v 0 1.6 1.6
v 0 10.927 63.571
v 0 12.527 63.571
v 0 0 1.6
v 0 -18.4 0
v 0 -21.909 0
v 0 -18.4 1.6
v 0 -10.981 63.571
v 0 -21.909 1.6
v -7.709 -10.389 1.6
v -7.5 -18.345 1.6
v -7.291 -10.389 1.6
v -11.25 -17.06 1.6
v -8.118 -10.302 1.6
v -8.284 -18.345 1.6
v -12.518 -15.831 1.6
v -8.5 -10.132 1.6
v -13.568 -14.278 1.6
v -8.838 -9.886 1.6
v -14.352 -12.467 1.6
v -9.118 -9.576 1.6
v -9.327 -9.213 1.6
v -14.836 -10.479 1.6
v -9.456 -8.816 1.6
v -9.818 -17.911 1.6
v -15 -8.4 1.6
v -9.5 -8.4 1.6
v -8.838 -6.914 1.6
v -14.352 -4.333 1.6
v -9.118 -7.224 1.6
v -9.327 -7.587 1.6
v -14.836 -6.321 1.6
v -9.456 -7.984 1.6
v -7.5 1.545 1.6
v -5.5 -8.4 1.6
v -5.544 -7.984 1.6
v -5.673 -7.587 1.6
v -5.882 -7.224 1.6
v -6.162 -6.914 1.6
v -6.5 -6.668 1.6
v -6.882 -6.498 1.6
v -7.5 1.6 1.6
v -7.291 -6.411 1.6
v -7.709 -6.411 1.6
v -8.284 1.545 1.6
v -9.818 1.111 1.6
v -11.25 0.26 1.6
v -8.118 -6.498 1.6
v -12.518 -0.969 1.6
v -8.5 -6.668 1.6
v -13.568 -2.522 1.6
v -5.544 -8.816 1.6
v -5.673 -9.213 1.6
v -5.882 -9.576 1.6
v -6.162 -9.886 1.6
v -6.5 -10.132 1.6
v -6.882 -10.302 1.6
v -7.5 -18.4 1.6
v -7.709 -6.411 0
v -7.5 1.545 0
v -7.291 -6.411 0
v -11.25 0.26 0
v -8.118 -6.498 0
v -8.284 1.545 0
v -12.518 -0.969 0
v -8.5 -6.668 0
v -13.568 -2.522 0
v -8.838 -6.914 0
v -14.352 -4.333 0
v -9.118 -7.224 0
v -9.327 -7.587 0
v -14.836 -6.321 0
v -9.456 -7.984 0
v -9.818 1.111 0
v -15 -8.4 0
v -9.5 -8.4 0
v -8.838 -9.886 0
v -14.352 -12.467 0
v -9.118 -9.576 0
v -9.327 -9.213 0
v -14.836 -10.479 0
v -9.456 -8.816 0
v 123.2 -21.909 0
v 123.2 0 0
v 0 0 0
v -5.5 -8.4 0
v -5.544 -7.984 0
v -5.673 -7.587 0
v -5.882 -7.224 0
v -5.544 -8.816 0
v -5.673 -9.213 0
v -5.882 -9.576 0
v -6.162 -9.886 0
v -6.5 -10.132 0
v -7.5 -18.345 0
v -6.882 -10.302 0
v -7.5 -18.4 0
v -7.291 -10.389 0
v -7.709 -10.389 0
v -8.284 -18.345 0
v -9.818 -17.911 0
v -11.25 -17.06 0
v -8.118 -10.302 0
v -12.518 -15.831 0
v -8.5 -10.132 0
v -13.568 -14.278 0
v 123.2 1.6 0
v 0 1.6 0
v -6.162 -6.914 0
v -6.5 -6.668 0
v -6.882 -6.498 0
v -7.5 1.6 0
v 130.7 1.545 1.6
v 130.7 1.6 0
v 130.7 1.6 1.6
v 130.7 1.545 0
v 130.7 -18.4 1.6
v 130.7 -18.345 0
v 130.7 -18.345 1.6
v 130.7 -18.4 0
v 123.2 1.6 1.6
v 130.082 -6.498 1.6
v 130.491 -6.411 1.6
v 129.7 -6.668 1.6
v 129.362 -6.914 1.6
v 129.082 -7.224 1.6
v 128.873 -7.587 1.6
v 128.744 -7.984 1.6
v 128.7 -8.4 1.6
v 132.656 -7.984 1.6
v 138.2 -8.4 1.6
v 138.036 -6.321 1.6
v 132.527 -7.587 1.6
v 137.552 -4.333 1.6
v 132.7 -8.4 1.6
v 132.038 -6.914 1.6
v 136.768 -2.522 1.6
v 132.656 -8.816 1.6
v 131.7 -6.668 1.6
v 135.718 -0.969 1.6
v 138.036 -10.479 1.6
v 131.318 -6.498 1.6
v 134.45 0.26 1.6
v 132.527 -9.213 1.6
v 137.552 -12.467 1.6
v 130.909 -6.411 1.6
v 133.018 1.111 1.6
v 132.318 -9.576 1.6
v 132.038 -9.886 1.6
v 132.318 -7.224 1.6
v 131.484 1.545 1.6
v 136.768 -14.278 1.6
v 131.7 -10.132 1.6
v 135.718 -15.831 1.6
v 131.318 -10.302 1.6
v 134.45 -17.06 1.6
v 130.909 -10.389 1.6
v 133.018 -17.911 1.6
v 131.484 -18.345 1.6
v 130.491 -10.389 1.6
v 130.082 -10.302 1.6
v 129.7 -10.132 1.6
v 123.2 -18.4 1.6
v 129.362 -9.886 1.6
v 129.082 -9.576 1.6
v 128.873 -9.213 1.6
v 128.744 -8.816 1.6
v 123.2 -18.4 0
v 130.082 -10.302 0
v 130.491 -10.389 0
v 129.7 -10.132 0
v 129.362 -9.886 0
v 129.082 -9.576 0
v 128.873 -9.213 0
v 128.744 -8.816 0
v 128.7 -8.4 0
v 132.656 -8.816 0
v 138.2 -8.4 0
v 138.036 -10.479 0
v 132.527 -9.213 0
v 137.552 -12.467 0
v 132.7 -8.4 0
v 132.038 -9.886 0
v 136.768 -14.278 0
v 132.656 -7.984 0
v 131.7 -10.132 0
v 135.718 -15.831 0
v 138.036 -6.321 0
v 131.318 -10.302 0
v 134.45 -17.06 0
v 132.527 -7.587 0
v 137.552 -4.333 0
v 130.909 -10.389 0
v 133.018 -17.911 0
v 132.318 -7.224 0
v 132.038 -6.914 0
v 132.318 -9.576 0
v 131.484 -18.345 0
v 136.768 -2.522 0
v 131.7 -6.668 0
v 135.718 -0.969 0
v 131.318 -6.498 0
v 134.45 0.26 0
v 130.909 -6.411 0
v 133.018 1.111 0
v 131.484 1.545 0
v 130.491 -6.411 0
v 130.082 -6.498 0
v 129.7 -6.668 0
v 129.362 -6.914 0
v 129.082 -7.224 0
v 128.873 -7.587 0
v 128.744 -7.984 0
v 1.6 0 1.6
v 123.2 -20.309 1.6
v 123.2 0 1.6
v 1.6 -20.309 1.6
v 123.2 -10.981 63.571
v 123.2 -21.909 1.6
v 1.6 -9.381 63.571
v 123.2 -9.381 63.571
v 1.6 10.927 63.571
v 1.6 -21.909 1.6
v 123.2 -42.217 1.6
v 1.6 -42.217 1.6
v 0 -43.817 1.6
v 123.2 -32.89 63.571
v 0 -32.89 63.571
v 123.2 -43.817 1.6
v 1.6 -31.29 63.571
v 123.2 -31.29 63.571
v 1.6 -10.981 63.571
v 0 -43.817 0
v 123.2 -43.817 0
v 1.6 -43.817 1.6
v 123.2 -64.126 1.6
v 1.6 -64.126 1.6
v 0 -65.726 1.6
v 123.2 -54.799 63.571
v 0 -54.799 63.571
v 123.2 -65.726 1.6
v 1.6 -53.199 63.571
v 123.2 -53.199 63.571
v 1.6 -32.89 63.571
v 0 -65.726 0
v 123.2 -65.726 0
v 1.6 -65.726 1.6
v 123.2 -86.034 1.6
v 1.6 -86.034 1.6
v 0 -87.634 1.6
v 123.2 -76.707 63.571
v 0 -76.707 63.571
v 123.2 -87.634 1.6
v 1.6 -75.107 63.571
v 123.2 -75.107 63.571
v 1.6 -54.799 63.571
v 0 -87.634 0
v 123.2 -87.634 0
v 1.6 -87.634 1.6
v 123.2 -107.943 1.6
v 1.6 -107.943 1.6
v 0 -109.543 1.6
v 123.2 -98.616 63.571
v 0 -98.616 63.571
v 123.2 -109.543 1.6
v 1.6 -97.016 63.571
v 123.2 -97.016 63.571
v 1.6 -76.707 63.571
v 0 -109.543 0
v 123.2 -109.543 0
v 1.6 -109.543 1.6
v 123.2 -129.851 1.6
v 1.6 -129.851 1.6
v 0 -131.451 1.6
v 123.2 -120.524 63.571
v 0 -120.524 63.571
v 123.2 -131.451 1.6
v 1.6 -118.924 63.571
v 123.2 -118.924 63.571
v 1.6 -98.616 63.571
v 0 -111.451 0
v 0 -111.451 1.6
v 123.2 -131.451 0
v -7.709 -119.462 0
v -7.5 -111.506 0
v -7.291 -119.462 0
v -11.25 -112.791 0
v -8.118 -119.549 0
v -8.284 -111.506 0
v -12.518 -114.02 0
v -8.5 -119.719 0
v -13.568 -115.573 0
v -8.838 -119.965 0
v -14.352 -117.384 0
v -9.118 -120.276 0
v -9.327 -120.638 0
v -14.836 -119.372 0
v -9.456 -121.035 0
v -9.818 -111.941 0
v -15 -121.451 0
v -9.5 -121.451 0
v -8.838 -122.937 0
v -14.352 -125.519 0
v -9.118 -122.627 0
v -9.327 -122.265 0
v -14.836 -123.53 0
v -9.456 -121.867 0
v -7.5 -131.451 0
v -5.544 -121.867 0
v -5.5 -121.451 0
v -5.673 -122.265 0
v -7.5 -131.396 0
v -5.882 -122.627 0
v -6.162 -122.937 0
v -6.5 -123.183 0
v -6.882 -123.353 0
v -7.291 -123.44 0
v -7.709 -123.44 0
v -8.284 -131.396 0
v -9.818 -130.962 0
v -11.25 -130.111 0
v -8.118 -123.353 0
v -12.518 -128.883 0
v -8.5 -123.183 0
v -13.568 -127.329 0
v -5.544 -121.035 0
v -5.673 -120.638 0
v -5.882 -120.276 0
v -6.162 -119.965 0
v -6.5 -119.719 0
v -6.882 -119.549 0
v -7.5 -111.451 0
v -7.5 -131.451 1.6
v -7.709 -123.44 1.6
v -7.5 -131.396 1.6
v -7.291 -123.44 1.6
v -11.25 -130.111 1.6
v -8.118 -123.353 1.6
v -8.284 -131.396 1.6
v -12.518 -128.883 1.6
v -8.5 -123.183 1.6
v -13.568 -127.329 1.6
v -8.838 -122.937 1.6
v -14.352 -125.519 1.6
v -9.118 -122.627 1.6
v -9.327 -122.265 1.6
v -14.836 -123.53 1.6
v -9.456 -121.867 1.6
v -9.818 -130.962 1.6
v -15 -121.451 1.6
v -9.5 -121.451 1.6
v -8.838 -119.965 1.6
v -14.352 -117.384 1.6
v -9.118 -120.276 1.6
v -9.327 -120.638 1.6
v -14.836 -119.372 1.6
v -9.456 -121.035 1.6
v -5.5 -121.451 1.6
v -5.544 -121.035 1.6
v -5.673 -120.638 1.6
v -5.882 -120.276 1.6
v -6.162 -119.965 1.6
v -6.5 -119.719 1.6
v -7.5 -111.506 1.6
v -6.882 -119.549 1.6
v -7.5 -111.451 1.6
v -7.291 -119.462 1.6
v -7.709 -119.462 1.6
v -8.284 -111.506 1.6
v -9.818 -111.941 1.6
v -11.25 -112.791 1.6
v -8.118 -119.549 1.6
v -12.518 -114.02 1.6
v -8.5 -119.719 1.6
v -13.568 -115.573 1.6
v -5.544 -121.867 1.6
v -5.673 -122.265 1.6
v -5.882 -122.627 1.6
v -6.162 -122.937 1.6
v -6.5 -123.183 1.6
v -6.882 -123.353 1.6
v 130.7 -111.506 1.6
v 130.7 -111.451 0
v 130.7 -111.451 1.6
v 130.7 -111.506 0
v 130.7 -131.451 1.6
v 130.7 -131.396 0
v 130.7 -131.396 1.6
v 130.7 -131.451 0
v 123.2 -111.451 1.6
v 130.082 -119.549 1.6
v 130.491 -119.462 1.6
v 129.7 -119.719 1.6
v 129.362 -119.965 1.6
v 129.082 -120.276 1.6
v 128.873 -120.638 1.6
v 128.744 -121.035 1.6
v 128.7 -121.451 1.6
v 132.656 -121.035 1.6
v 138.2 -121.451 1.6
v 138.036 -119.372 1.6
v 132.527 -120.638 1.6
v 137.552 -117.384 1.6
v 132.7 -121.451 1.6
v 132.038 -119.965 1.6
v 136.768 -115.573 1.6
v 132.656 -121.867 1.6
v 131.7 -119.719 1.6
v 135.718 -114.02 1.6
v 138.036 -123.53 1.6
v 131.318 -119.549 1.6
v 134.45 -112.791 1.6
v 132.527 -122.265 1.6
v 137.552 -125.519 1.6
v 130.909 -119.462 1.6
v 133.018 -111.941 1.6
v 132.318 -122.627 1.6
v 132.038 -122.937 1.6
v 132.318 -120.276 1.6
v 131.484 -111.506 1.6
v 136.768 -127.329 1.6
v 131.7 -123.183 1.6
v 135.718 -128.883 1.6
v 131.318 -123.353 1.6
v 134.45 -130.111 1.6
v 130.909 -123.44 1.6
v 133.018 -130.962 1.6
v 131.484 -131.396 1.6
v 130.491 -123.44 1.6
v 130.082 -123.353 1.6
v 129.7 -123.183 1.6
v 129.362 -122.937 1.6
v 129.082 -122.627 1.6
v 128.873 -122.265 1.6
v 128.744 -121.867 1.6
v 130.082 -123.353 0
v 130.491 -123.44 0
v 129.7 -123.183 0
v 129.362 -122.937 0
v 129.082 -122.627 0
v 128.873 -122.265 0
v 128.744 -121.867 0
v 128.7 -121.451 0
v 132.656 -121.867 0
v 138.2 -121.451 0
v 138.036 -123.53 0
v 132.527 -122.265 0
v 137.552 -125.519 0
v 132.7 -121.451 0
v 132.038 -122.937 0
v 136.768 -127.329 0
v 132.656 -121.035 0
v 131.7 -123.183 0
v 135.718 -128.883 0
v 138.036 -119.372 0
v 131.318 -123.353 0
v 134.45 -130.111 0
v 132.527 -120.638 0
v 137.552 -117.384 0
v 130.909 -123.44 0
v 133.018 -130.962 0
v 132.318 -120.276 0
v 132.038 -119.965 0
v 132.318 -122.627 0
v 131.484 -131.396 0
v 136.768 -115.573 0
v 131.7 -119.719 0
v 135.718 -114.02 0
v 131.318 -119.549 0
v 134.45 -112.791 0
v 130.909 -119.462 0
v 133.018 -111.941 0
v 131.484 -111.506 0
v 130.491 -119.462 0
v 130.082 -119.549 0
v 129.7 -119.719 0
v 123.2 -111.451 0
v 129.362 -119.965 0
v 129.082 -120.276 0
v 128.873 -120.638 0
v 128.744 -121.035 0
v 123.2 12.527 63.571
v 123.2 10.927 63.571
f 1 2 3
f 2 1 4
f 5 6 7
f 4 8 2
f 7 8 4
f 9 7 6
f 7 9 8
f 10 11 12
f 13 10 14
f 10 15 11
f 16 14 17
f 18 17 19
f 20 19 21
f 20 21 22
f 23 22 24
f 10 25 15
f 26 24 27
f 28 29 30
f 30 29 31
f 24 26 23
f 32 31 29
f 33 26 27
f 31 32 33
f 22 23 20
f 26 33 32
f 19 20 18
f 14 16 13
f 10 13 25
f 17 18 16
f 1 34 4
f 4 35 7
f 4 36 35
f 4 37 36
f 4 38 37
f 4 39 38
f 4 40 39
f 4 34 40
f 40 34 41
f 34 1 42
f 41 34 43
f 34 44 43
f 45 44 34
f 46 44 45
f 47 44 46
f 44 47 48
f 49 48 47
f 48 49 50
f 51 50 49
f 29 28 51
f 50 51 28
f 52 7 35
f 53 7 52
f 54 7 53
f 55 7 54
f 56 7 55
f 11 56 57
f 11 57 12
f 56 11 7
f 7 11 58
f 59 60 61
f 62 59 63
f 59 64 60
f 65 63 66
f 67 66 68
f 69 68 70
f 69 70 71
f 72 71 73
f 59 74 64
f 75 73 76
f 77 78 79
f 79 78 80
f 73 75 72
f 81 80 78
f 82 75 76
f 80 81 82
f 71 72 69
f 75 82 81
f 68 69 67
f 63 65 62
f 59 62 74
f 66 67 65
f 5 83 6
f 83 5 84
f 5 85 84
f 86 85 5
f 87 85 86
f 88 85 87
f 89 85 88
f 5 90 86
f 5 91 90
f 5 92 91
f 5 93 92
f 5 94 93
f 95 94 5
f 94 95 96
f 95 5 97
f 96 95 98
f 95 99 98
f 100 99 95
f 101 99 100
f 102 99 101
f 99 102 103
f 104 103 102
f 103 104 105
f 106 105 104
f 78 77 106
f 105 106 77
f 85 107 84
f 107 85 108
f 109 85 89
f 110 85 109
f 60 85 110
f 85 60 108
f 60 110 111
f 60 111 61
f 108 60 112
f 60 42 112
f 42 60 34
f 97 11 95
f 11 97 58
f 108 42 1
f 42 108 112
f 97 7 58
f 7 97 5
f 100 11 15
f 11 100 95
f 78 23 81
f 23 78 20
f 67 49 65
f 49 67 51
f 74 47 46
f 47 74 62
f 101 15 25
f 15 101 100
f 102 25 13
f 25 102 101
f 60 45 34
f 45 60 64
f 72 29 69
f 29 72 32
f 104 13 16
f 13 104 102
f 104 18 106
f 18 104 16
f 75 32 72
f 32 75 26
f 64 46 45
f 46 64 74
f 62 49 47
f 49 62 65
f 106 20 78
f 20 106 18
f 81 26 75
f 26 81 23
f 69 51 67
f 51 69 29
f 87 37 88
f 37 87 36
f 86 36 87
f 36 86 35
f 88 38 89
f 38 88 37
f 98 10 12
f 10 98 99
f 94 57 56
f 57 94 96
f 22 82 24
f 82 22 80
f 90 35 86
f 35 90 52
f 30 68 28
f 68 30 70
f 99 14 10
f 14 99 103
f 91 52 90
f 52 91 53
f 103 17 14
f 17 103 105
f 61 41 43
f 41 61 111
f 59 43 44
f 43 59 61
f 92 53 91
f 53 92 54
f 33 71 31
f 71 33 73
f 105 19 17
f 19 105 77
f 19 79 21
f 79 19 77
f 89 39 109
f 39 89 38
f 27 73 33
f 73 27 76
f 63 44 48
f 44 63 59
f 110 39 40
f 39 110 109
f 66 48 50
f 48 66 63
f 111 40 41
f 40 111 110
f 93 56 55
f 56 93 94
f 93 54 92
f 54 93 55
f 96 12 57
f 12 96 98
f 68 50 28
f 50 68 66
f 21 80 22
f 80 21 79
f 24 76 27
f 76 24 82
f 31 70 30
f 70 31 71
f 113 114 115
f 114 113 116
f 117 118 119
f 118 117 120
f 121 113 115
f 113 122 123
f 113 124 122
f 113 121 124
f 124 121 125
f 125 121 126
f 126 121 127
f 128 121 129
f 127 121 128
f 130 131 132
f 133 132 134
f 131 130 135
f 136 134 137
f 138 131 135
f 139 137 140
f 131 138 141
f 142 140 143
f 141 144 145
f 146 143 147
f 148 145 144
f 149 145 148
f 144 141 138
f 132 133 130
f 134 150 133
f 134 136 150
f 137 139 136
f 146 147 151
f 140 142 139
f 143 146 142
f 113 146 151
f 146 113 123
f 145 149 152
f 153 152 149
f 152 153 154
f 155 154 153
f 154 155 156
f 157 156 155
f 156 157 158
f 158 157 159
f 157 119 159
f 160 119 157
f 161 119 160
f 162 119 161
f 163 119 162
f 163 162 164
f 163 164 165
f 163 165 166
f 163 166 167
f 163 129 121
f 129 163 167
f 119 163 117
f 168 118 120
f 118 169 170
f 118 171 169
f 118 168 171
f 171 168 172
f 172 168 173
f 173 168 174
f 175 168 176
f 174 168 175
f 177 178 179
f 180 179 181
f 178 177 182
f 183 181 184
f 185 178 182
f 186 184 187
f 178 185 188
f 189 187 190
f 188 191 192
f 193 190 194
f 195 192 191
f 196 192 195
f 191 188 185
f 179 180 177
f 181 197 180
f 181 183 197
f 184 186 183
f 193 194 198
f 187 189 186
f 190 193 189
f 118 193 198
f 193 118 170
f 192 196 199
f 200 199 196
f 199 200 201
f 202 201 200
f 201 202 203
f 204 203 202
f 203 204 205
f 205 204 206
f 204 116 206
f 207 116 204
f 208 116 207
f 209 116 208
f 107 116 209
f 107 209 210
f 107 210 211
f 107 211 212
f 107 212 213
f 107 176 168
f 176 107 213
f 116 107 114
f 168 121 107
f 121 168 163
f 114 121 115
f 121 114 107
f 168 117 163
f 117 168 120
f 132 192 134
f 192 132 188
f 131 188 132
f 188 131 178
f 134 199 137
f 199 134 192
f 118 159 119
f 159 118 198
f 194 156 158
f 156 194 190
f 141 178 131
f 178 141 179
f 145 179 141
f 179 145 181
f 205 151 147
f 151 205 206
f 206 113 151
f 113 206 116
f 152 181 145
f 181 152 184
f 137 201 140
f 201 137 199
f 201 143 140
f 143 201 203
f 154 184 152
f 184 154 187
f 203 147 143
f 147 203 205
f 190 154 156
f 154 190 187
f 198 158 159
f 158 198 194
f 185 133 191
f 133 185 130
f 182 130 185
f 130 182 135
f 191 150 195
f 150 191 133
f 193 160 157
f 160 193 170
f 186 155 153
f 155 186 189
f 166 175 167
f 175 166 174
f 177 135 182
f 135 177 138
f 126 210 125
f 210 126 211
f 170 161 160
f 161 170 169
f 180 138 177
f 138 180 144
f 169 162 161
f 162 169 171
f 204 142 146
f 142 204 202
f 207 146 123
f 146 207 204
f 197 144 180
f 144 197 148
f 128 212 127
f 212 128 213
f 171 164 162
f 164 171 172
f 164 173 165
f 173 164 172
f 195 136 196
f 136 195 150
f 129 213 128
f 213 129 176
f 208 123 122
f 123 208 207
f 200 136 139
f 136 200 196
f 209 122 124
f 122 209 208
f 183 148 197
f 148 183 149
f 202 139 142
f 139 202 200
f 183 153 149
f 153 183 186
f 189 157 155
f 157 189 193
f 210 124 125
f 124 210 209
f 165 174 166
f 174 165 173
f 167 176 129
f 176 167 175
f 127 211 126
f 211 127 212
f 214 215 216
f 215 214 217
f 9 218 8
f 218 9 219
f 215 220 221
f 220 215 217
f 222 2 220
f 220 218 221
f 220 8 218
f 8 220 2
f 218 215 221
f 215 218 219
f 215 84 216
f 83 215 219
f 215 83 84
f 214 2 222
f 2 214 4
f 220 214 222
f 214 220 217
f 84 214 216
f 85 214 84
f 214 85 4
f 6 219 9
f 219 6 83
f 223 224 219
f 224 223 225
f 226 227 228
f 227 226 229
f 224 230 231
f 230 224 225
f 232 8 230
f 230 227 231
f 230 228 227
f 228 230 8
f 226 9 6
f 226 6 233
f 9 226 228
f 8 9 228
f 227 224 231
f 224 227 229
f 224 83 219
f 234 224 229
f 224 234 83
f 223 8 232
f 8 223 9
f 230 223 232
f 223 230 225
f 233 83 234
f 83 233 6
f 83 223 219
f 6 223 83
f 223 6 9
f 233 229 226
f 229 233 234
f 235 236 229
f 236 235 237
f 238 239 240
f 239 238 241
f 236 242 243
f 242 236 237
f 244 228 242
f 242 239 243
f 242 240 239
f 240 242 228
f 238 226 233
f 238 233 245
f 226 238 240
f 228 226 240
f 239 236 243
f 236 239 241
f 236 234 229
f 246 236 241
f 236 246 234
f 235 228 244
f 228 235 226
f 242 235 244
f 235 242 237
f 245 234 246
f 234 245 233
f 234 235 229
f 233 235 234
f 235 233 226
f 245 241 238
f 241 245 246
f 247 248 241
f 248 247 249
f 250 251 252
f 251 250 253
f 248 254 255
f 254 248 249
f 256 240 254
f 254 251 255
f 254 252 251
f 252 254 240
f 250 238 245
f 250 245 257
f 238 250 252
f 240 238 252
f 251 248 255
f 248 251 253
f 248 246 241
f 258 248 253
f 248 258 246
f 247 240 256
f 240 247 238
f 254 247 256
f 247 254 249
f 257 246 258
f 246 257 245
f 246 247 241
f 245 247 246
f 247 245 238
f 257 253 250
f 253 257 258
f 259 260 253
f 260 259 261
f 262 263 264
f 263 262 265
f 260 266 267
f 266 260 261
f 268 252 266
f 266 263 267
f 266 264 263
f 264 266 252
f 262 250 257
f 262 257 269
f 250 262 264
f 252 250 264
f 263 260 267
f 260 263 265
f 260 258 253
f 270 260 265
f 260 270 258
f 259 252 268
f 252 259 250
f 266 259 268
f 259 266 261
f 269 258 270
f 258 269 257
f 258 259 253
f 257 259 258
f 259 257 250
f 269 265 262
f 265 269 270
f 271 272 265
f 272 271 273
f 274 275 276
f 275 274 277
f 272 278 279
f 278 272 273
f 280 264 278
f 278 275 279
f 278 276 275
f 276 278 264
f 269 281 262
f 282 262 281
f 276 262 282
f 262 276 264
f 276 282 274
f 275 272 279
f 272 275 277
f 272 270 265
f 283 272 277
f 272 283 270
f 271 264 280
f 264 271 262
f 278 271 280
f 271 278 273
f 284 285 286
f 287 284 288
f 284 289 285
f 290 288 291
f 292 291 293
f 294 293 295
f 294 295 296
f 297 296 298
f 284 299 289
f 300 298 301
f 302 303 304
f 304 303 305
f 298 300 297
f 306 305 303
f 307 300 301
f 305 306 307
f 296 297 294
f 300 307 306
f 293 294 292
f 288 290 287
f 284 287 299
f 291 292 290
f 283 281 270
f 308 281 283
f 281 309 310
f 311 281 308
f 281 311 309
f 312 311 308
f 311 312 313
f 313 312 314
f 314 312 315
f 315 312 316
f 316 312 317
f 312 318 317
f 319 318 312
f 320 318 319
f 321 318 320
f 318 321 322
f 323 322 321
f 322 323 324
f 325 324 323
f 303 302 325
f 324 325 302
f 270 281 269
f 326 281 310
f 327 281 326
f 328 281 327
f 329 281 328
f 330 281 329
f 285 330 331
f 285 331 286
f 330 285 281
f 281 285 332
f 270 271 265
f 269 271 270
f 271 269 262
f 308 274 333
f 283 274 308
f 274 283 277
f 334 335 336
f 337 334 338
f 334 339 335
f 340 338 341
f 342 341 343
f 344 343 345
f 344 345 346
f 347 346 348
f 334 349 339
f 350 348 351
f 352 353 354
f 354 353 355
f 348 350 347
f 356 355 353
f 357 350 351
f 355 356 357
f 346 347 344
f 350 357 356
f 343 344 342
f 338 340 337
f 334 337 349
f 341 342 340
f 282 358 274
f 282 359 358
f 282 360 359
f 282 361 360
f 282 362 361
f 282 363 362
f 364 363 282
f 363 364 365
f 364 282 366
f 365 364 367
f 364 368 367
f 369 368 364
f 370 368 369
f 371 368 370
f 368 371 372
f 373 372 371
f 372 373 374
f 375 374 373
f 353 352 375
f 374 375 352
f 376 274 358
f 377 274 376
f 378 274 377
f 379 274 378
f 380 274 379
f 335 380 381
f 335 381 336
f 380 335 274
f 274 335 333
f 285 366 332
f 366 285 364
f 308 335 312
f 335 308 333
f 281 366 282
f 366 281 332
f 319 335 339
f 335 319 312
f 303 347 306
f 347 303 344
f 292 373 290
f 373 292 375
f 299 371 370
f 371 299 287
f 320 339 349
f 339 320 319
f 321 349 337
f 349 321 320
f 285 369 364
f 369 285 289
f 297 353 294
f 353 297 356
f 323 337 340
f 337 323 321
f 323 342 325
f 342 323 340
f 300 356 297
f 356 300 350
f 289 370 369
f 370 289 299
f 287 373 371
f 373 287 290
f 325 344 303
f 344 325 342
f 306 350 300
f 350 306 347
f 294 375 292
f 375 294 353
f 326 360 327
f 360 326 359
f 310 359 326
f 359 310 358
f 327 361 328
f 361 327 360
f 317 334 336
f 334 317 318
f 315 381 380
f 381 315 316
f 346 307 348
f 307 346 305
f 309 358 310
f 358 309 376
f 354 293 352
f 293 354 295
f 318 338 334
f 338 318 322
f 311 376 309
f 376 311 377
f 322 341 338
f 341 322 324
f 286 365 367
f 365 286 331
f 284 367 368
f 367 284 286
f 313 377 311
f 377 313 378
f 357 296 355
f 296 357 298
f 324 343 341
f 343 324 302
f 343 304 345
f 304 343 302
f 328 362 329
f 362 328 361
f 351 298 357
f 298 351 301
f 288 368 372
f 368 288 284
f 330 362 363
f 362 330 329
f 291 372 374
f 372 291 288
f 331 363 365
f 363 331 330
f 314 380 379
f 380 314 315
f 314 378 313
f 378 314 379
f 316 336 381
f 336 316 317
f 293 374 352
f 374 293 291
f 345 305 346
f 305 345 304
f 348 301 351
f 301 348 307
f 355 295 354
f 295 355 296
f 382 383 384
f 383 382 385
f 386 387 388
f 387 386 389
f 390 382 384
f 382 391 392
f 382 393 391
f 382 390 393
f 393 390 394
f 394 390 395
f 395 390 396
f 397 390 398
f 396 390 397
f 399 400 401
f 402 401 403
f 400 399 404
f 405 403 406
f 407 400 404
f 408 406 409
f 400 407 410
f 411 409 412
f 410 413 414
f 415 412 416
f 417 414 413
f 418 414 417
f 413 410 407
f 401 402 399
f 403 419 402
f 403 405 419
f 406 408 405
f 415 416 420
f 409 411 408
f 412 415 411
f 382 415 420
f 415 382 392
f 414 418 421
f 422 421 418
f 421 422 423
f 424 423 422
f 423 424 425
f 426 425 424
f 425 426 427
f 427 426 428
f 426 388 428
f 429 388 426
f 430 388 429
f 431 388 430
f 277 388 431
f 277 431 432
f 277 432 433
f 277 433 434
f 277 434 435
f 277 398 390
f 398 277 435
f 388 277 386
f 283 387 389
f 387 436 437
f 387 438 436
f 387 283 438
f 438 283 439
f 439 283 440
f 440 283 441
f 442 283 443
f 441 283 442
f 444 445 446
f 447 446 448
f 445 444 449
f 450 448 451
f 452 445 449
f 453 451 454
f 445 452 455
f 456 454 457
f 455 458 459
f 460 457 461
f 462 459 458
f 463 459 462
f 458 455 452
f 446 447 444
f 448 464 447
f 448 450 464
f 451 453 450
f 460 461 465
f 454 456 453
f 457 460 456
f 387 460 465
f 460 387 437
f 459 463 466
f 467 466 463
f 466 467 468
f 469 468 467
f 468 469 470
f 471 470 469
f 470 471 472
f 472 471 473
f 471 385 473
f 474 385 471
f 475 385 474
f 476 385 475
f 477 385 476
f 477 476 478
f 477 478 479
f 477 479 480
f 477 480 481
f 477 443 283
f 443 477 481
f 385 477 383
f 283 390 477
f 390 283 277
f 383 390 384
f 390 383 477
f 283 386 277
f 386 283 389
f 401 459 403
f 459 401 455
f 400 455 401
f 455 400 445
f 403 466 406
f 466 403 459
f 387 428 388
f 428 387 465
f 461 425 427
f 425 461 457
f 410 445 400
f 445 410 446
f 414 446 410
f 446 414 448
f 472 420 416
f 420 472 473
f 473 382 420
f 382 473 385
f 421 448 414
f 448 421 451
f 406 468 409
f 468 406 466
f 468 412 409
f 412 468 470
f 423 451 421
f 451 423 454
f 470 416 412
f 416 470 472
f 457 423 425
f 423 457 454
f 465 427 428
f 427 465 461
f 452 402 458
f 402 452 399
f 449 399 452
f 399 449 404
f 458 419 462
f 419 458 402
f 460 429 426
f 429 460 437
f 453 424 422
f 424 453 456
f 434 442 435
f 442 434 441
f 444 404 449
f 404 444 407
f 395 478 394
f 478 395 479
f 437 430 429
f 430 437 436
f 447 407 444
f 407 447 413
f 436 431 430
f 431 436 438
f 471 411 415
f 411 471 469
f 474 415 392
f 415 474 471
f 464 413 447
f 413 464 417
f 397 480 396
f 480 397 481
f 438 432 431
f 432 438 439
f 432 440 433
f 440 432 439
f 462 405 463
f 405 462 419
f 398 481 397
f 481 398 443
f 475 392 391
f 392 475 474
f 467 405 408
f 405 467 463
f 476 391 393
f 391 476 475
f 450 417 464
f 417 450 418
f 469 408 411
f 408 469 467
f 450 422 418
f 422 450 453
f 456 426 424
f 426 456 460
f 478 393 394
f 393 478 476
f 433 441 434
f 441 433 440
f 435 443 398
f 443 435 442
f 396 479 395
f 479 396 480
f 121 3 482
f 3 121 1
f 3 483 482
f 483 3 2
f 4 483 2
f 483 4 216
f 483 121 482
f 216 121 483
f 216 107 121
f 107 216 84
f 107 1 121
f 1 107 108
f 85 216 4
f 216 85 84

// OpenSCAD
phone_height = 120;
phone_width = 90;
phone_thickness = 20;
shelf_angle = 10;
shelf_width_percentage = 66;  // Recommend > 50
number_of_shelves = 6;
thickness = 1.6;
sides = 1;  // [0:No, 1:Left, 2:Right, 3:Both]
tabs = 1;  // [0:No, 1:Yes]
tab_width = 15;
tab_height = 20;
tab_hole_diameter = 4;

width_adjusted = phone_width * shelf_width_percentage / 100 + phone_thickness / tan(90 - shelf_angle);
echo(width_adjusted=width_adjusted);
height_adjusted = phone_thickness / sin(90 - shelf_angle);
echo(height_adjusted=height_adjusted);
bottom_tab_offset = -number_of_shelves * (height_adjusted + thickness);
$fn = 30;

module shelf(length, width, height, thickness, shelf_angle, sides) {
  delta_y = sin(shelf_angle) * width;
  echo(delta_y = delta_y);
  delta_z = cos(shelf_angle) * width;
  echo(delta_z = delta_z);
  polyhedron([
    [0, 0, thickness],
    [0, thickness, thickness],
    [length, thickness, thickness],
    [length, 0, thickness],
    [0, delta_y, thickness + delta_z],
    [0, delta_y + thickness, thickness + delta_z],
    [length, delta_y + thickness, thickness + delta_z],
    [length, delta_y, thickness + delta_z]],
    [
    [0, 3, 2, 1],  // Bottom
    [0, 1, 5, 4],  // Back
    [4, 5, 6, 7],  // Top
    [2, 3, 7, 6],  // Front
    [0, 4, 7, 3],  // Left
    [1, 2, 6, 5]]);  // Right
  if (sides == 1 || sides == 3) {
    polyhedron([
      [0, thickness, thickness],
      [0, thickness + height, thickness],
      [thickness, thickness + height, thickness],
      [thickness, thickness, thickness],
      [0, delta_y + thickness, thickness + delta_z],
      [0, delta_y + thickness + height, thickness + delta_z],
      [thickness, delta_y + thickness + height, thickness + delta_z],
      [thickness, delta_y + thickness, thickness + delta_z]],
      [
      [0, 3, 2, 1],  // Bottom
      [0, 1, 5, 4],  // Back
      [4, 5, 6, 7],  // Top
      [2, 3, 7, 6],  // Front
      [0, 4, 7, 3],  // Left
      [1, 2, 6, 5]]);  // Right
  }
  if (sides == 2 || sides == 3) {
    polyhedron([
      [length - thickness, thickness, thickness],
      [length - thickness, thickness + height, thickness],
      [length, thickness + height, thickness],
      [length, thickness, thickness],
      [length - thickness, delta_y + thickness, thickness + delta_z],
      [length - thickness, delta_y + thickness + height, thickness + delta_z],
      [length, delta_y + thickness + height, thickness + delta_z],
      [length, delta_y + thickness, thickness + delta_z]],
      [
      [0, 3, 2, 1],  // Bottom
      [0, 1, 5, 4],  // Back
      [4, 5, 6, 7],  // Top
      [2, 3, 7, 6],  // Front
      [0, 4, 7, 3],  // Left
      [1, 2, 6, 5]]);  // Right
  }
}

module tab(width, height, thickness, diameter, left_side) {
  difference() {
    union() {
      translate([left_side ? width * 0.5 : 0, 0, 0]) {
        cube([width * 0.5, height, thickness]);
      }
      translate([width * 0.5, height * 0.5, 0]) scale([width / height, 1, 1]) {
        cylinder(h=thickness, r=height * 0.5);
      }
    }
    translate([width * 0.5, height * 0.5, -thickness * 0.1]) {
      cylinder(h=thickness * 1.2, r=diameter * 0.5);
    }
  }
}


module left_tab(width, height, thickness, diameter) {
  tab(width, height, thickness, diameter, 1);
}


module right_tab(width, height, thickness, diameter) {
  tab(width, height, thickness, diameter, 0);
}


// Top shelf
shelf(phone_height + 2 * thickness, width_adjusted,
      height_adjusted, thickness, shelf_angle, 0);
cube([phone_height + 2 * thickness, thickness, thickness]);
if (tabs) {
  translate([-tab_width, thickness - tab_height, 0]) {
    left_tab(tab_width, tab_height, thickness, tab_hole_diameter);
  }
  translate([2 * thickness + phone_height, thickness - tab_height, 0]) {
    right_tab(tab_width, tab_height, thickness, tab_hole_diameter);
  }
}

for(ii = [1:number_of_shelves]) {
  translate([0, -ii * (height_adjusted + thickness), 0]) {
    cube([phone_height + 2 * thickness,
          height_adjusted + thickness, thickness]);
    shelf(phone_height + 2 * thickness, width_adjusted,
          height_adjusted, thickness, shelf_angle, sides);
  }
}
if (tabs) {
  translate([-tab_width, bottom_tab_offset, 0]) {
    left_tab(tab_width, tab_height, thickness, tab_hole_diameter);
  }
  translate([2 * thickness + phone_height, bottom_tab_offset, 0]) {
    right_tab(tab_width, tab_height, thickness, tab_hole_diameter);
  }
}
